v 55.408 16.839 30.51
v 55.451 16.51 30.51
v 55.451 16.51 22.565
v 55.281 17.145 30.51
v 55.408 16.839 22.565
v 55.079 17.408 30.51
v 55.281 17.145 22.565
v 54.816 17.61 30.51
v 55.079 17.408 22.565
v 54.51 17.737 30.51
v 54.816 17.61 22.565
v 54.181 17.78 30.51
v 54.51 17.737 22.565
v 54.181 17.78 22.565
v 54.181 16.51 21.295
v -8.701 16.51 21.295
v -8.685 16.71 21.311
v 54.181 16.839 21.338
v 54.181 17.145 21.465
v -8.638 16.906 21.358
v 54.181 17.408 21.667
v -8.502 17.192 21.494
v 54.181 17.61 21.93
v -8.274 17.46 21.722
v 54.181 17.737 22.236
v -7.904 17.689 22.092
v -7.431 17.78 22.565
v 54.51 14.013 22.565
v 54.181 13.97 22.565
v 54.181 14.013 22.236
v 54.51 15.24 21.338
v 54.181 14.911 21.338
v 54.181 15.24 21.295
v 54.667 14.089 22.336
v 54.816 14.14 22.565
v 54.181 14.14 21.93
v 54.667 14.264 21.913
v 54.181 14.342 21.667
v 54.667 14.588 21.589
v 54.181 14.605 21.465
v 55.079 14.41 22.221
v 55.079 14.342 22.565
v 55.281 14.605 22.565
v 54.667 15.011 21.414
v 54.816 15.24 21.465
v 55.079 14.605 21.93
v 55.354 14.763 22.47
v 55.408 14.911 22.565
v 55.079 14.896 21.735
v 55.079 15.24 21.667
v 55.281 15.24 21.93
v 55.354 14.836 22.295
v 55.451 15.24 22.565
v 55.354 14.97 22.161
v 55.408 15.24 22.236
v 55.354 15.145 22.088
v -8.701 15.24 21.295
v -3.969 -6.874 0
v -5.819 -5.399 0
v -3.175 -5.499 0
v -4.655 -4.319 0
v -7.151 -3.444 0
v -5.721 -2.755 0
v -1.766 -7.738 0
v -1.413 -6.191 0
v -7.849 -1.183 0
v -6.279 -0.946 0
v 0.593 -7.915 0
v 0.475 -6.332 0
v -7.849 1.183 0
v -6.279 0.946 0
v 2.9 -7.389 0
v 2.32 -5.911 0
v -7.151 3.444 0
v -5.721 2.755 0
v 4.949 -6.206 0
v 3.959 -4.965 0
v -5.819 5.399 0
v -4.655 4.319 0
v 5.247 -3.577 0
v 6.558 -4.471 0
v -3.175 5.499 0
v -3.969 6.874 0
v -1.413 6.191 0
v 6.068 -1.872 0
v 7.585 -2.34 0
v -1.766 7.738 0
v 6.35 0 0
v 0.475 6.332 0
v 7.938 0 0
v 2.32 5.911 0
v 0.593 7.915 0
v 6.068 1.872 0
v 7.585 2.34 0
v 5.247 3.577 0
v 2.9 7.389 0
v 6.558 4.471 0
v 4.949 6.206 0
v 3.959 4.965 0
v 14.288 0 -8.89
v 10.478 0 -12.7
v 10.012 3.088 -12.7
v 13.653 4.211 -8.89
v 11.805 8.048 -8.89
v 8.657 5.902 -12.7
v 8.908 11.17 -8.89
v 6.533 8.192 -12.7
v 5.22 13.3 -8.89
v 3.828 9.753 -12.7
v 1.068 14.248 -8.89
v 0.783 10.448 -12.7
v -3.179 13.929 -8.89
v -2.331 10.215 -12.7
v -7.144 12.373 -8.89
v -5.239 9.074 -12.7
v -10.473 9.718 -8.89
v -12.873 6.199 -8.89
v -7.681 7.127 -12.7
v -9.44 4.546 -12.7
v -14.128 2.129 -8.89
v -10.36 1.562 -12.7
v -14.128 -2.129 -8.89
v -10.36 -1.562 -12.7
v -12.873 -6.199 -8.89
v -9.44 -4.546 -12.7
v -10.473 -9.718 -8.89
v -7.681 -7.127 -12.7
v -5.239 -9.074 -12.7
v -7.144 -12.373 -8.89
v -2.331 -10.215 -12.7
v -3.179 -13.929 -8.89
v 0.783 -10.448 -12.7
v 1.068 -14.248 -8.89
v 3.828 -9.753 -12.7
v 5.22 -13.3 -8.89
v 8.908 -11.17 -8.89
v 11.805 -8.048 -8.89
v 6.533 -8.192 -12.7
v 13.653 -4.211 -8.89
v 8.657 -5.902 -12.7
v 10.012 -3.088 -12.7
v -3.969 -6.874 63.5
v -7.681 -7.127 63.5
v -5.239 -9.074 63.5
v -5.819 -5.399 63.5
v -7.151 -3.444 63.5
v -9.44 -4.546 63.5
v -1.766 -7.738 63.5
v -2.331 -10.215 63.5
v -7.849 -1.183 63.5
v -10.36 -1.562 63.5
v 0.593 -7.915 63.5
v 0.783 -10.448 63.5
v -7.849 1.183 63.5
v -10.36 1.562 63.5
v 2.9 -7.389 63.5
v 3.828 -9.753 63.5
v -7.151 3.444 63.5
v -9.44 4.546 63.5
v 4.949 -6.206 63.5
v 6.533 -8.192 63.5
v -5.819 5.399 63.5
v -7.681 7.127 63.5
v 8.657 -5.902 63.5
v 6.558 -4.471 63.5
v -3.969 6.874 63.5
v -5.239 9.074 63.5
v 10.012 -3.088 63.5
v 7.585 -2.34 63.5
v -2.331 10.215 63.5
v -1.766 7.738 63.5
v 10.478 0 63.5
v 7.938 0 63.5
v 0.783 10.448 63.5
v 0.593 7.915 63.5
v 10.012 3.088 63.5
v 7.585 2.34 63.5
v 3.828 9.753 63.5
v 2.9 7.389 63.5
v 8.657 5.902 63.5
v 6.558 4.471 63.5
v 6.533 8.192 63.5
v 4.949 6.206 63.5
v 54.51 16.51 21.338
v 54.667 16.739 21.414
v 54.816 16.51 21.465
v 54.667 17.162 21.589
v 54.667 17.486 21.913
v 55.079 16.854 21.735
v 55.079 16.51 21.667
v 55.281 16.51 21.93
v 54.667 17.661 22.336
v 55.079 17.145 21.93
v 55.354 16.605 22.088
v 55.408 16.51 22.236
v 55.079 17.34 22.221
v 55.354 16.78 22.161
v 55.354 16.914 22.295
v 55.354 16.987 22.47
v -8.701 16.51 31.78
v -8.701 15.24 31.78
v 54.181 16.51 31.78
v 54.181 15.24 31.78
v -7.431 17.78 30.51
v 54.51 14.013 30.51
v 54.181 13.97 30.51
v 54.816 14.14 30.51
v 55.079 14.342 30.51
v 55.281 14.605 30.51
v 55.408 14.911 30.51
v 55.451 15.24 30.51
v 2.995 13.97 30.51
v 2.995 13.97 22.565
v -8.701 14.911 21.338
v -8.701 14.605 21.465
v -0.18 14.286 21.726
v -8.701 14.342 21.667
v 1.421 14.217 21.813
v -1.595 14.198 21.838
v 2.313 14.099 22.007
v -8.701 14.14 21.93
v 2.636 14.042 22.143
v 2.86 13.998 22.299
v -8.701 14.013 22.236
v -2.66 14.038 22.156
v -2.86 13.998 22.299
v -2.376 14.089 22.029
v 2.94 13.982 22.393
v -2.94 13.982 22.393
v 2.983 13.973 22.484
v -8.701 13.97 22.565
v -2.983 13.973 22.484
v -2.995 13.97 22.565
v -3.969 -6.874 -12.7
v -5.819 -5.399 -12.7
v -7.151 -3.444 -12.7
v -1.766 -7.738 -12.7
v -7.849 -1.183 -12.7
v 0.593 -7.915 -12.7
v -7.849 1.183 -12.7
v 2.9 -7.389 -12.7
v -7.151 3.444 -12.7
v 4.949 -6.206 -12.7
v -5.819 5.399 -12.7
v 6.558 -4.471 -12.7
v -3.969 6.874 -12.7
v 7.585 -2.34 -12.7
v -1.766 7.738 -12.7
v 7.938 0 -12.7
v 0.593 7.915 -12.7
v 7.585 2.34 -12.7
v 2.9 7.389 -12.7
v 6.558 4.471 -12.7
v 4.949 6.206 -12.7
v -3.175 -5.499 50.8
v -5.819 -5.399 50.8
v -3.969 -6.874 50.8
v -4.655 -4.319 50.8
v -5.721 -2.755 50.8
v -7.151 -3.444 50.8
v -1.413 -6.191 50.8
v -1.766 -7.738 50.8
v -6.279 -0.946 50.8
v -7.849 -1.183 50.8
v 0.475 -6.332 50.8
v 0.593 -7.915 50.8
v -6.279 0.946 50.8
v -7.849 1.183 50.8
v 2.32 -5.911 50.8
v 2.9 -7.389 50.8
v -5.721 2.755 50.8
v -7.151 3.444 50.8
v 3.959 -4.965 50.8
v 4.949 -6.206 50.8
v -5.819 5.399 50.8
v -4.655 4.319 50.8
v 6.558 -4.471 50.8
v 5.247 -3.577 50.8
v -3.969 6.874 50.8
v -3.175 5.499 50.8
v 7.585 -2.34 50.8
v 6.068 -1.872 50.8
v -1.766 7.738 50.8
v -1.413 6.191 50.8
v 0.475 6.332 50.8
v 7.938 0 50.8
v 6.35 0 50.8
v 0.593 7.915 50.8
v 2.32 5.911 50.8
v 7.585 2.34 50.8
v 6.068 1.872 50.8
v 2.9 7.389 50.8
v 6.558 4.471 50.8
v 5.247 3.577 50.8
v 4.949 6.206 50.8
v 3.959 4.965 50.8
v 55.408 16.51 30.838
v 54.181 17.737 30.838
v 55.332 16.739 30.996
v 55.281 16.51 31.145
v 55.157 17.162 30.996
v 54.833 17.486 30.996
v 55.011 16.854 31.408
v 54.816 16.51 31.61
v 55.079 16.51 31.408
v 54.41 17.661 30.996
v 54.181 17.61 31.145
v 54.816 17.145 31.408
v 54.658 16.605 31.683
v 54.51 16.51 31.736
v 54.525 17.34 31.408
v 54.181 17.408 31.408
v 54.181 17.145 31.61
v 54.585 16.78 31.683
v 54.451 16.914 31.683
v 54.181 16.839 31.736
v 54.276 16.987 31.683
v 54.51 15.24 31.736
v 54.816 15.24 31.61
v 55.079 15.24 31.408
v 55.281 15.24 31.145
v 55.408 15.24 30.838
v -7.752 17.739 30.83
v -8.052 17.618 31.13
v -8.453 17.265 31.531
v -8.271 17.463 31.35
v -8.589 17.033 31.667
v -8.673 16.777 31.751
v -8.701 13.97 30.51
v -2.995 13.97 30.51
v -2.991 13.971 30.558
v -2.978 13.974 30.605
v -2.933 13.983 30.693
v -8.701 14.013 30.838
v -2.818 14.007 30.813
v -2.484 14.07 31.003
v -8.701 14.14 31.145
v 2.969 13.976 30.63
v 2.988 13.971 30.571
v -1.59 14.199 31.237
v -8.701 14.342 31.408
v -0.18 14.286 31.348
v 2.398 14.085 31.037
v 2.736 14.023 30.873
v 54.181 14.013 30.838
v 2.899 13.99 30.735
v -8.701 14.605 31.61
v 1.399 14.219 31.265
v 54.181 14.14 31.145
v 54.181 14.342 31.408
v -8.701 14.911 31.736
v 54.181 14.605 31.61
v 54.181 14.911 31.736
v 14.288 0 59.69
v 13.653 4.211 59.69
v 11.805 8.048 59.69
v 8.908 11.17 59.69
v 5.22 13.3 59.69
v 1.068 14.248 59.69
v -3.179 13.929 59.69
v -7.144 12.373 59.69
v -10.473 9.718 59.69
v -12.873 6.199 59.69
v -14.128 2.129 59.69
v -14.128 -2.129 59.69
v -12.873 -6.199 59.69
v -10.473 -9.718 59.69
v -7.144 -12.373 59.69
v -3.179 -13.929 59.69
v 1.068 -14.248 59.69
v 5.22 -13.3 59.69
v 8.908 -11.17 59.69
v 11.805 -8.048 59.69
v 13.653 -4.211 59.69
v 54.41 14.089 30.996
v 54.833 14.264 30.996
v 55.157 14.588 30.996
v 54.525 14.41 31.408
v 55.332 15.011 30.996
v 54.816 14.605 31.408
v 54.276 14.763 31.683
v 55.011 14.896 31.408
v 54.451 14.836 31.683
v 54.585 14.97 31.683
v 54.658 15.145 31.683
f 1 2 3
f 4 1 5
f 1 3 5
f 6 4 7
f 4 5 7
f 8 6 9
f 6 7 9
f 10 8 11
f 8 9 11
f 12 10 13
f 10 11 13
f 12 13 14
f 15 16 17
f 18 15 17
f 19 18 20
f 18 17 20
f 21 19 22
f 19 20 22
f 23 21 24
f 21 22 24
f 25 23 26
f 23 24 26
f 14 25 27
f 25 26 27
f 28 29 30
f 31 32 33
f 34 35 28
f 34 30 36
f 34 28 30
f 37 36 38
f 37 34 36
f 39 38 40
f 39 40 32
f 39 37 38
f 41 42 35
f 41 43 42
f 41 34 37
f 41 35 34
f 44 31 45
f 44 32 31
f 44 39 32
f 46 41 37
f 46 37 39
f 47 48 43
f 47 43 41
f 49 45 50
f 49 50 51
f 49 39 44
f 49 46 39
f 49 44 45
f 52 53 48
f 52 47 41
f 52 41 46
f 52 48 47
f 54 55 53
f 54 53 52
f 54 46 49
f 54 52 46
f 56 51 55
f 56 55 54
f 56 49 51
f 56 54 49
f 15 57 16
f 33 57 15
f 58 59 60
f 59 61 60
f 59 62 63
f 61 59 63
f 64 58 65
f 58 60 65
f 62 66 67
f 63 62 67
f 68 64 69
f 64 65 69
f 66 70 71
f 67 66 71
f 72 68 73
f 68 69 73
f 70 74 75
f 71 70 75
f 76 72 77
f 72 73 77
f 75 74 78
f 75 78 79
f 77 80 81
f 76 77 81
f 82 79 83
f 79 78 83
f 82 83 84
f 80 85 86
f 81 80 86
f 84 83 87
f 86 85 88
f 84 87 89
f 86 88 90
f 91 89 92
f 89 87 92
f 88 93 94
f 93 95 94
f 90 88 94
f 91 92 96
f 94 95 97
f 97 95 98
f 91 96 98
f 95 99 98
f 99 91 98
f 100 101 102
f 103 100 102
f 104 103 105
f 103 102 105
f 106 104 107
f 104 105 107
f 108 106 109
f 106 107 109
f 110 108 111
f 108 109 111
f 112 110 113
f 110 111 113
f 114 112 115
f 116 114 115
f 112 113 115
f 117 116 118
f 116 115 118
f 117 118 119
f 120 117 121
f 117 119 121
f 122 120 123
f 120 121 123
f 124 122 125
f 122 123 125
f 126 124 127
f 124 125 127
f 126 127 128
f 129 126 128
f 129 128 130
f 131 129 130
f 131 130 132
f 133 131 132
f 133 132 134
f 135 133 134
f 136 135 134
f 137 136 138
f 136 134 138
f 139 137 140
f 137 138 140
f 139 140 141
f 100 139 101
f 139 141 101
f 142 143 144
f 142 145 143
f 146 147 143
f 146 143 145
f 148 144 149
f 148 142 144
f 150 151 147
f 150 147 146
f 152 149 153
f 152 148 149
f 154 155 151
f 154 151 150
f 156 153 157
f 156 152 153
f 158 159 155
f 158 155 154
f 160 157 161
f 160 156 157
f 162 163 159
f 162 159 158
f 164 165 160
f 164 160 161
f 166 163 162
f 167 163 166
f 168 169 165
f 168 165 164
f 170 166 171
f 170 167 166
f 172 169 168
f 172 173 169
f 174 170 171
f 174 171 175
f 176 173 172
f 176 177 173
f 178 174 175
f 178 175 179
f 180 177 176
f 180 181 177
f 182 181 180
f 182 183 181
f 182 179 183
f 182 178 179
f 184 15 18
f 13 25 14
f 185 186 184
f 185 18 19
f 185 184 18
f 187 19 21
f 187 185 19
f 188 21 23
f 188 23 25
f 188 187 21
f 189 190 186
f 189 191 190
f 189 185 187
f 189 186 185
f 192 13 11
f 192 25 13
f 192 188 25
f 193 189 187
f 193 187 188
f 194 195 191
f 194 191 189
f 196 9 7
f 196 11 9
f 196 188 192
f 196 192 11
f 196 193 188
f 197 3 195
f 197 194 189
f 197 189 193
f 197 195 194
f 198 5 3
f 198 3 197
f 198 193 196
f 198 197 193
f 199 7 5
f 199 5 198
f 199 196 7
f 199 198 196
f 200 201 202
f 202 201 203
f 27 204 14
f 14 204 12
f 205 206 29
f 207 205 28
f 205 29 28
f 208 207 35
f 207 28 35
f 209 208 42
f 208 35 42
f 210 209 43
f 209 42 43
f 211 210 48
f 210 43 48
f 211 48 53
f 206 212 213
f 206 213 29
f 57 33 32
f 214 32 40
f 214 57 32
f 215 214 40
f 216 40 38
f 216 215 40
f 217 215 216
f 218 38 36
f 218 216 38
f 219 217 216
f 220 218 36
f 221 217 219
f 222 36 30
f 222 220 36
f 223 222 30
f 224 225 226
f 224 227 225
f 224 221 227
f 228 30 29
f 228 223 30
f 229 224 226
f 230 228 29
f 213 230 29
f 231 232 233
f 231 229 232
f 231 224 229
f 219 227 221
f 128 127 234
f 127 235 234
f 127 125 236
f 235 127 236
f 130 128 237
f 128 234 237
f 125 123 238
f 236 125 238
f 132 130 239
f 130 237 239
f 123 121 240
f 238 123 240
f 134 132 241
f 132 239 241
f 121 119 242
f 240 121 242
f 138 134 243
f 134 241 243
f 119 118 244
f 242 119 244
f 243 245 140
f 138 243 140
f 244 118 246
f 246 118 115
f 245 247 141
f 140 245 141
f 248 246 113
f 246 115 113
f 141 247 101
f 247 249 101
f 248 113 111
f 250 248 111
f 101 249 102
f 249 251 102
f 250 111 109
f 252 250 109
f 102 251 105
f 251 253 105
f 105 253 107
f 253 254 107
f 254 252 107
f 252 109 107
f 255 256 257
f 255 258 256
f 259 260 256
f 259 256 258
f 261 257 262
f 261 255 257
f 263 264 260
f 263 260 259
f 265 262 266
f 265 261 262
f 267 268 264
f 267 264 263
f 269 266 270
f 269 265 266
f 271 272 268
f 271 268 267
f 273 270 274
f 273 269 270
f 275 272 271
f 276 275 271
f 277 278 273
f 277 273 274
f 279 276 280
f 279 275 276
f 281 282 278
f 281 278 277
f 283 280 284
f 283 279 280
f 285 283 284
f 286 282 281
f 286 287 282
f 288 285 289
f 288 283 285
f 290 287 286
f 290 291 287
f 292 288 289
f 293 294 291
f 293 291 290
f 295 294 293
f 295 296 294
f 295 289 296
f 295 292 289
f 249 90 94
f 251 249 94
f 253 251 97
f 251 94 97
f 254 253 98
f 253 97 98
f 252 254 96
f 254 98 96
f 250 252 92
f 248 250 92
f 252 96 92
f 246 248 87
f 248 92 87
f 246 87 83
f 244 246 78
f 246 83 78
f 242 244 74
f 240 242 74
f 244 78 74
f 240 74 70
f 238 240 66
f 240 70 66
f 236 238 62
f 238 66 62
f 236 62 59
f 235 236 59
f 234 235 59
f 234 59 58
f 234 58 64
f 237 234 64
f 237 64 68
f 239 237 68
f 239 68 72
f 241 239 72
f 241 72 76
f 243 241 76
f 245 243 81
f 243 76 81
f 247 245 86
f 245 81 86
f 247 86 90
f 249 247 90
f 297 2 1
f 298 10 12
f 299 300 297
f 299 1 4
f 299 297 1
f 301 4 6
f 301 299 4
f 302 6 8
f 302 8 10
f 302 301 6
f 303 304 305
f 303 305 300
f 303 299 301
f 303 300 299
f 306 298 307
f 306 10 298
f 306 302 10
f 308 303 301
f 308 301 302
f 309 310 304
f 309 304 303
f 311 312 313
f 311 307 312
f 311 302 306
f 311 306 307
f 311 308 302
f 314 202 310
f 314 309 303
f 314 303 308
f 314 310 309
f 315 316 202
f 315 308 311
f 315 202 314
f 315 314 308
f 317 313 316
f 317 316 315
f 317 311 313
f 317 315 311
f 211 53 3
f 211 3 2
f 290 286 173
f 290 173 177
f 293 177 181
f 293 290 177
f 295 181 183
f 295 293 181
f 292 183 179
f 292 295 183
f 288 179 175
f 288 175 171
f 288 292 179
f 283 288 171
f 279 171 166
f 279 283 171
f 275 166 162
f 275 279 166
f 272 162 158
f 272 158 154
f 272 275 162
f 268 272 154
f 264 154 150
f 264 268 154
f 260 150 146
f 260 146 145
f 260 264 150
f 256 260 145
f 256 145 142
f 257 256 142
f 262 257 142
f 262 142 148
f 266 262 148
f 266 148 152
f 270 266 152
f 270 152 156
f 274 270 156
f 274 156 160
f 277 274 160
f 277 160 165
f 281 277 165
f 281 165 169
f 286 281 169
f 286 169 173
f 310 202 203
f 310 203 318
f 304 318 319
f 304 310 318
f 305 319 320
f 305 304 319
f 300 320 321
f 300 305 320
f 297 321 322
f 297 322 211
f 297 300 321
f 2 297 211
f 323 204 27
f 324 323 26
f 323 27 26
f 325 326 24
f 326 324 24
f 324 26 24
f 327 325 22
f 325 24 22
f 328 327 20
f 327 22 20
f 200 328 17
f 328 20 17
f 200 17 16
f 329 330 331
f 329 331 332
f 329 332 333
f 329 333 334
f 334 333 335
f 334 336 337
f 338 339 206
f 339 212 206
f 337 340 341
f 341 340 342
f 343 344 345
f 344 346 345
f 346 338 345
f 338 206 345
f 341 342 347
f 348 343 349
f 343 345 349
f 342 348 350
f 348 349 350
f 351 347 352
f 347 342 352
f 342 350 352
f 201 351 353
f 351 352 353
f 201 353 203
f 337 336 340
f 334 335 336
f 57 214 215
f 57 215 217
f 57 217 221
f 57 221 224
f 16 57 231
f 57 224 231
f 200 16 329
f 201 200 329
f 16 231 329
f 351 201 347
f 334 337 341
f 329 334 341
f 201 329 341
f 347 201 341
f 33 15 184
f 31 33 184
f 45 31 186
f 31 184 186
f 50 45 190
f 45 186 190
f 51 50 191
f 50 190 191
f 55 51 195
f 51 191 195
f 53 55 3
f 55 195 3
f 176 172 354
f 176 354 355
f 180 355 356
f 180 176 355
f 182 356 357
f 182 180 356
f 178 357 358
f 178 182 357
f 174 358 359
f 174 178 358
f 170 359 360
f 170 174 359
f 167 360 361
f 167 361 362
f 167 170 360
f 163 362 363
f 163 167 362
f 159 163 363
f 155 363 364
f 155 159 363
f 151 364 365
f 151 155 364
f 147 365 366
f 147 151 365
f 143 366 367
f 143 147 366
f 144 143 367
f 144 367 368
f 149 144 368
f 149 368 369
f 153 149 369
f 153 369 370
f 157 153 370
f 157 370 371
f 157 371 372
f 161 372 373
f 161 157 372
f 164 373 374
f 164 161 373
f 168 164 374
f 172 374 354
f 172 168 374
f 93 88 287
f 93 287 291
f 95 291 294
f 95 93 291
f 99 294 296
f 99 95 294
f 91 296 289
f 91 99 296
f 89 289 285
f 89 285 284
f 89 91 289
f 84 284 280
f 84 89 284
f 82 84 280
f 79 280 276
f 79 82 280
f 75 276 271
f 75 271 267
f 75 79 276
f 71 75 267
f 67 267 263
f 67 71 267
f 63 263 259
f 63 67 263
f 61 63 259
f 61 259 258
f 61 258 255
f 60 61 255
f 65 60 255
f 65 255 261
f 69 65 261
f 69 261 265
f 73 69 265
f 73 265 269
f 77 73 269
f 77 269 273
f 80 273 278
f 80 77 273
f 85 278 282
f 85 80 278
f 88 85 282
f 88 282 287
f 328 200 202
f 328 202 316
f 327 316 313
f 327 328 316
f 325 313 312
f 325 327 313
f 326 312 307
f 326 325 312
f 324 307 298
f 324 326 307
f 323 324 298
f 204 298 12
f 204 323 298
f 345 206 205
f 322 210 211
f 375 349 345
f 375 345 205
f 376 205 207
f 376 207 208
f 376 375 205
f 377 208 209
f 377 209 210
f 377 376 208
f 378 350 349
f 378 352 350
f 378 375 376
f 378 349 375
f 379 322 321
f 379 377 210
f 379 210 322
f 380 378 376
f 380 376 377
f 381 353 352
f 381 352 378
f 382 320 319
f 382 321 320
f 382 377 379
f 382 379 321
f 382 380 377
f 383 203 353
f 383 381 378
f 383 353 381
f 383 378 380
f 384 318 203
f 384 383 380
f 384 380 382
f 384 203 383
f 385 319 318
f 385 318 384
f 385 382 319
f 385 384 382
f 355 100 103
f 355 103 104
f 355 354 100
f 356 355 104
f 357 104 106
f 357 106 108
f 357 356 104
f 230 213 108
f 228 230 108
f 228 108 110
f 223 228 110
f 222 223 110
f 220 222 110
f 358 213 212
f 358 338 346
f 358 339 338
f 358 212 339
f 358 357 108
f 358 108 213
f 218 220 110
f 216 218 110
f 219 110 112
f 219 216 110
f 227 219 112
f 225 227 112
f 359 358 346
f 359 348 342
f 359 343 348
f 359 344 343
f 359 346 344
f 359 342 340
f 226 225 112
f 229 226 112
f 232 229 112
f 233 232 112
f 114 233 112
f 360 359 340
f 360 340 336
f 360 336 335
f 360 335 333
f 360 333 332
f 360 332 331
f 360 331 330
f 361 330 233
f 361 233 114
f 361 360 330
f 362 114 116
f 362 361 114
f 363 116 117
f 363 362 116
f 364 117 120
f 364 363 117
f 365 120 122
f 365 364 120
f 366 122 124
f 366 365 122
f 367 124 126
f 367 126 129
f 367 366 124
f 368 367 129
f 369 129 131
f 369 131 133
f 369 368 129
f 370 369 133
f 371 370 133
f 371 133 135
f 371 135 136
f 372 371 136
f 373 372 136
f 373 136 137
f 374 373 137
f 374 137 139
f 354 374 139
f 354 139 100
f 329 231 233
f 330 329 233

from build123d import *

# Parameters (mm, degrees)
F0_R          = 7.9375
F0_R_2        = 6.35
F2_DEPTH      = 50.8
F3_R          = 14.2875
F3_R_2        = 7.9375
F4_DEPTH      = 63.5
F4_DEPTH_BACK = 12.7
F5_SIZE       = 3.81
F7_START      = -13.97
F6_W          = 64.1522035003
F6_H          = 10.4847997427
F7_DEPTH      = 3.81
F8_T1_DEPTH   = 66.0572035003
F8_T3_DEPTH   = 16.8347997427
F8_T5_DEPTH   = 7.9447997427
F8_T7_DEPTH   = 1.27
F8_S11_W      = 1.27
F8_S11_H      = 1.27
F8_T12_DEPTH  = 1.27
F8_S17_W      = 1.27
F8_S17_H      = 1.27
F8_T18_DEPTH  = 1.27
F8_S23_W      = 1.27
F8_S23_H      = 1.27
F8_T24_DEPTH  = 1.27
F8_S29_W      = 1.27
F8_S29_H      = 1.27
F8_T30_DEPTH  = 1.27
F8_T36_DEPTH  = 54.3607688419
F8_S37_R      = 14.2875
F8_T38_DEPTH  = 29
F8_T42_DEPTH  = 54.3607688419
F8_S43_R      = 14.2875
F8_T44_DEPTH  = 29
F8_T48_DEPTH  = 12.0558566395
F8_S49_R      = 14.2875
F8_T50_DEPTH  = 8
F8_T54_DEPTH  = 12.0558566395
F8_S55_R      = 14.2875
F8_T56_DEPTH  = 8


# Not quite as in the source:
# - a fillet or chamfer that OpenCascade refuses, or shapes differently, is made with other operations: its cross-section is extruded or revolved along the edge and cut away or added
# - a feature names something its author has since deleted; it is built from what else it names


with BuildPart() as f2:
    # F0 (on Top) → F2 (new body)
    with BuildSketch(Plane.XY):
        Circle(F0_R)
        Circle(F0_R_2, mode=Mode.SUBTRACT)
    extrude(amount=F2_DEPTH)

    # F3 (on face) → F4 (join, two sides)
    with BuildSketch(Plane.XY) as f4_sk:
        Circle(F3_R)
        Circle(F3_R_2, mode=Mode.SUBTRACT)
    extrude(amount=F4_DEPTH)
    extrude(f4_sk.sketch, amount=-F4_DEPTH_BACK)

    # F5
    f5_edges = [f2.edges().sort_by_distance(p)[0] for p in [
        (-14.2875, 0, 63.5),
        (-14.2875, 0, -12.7),
    ]]
    chamfer(f5_edges, length=F5_SIZE)

    # F6 (on Front) → F7 (join)
    with BuildSketch(Plane.XZ.offset(F7_START)):
        with Locations((23.3749561012, 26.5372619033)):
            Rectangle(F6_W, F6_H)
    extrude(amount=-F7_DEPTH)

    # F8: fillet of radius 1.27 on 11 edges, made by hand

    # F8_s2 → F8_t1 (cut)
    with BuildSketch(Plane.YZ.offset(-11.876145649)):
        with BuildLine():
            ThreePointArc((16.51, 31.7796617746), (17.4080256121, 31.4076873867), (17.78, 30.5096617746))
            Line((17.78, 30.5096617746), (17.78, 31.7796617746))
            Line((17.78, 31.7796617746), (16.51, 31.7796617746))
        make_face()
        with BuildLine():
            ThreePointArc((16.51, 21.2948620319), (17.4080256121, 21.6668364198), (17.78, 22.5648620319))
            Line((17.78, 22.5648620319), (17.78, 21.2948620319))
            Line((17.78, 21.2948620319), (16.51, 21.2948620319))
        make_face()
    extrude(amount=F8_T1_DEPTH, mode=Mode.SUBTRACT)

    # F8_s4 → F8_t3 (cut)
    with BuildSketch(Plane.XY.offset(18.1198620319)):
        with BuildLine():
            ThreePointArc((-7.431145649, 17.78), (-8.3291712611, 17.4080256121), (-8.701145649, 16.51))
            Line((-8.701145649, 16.51), (-8.701145649, 17.78))
            Line((-8.701145649, 17.78), (-7.431145649, 17.78))
        make_face()
    extrude(amount=F8_T3_DEPTH, mode=Mode.SUBTRACT)

    # F8_s6 → F8_t5 (cut)
    with BuildSketch(Plane.XY.offset(22.5648620319)):
        with BuildLine():
            ThreePointArc((54.1810578513, 13.97), (55.0790834634, 14.3419743879), (55.4510578513, 15.24))
            Line((55.4510578513, 15.24), (55.4510578513, 13.97))
            Line((55.4510578513, 13.97), (54.1810578513, 13.97))
        make_face()
        with BuildLine():
            ThreePointArc((55.4510578513, 16.51), (55.0790834634, 17.4080256121), (54.1810578513, 17.78))
            Line((54.1810578513, 17.78), (55.4510578513, 17.78))
            Line((55.4510578513, 17.78), (55.4510578513, 16.51))
        make_face()
    extrude(amount=F8_T5_DEPTH, mode=Mode.SUBTRACT)

    # F8_s8 → F8_t7 (cut)
    with BuildSketch(Plane.XZ.offset(-16.51)):
        with BuildLine():
            ThreePointArc((54.1810578513, 31.7796617746), (55.0790834634, 31.4076873867), (55.4510578513, 30.5096617746))
            Line((55.4510578513, 30.5096617746), (55.4510578513, 31.7796617746))
            Line((55.4510578513, 31.7796617746), (54.1810578513, 31.7796617746))
        make_face()
        with BuildLine():
            ThreePointArc((54.1810578513, 21.2948620319), (55.0790834634, 21.6668364198), (55.4510578513, 22.5648620319))
            Line((55.4510578513, 22.5648620319), (55.4510578513, 21.2948620319))
            Line((55.4510578513, 21.2948620319), (54.1810578513, 21.2948620319))
        make_face()
    extrude(amount=F8_T7_DEPTH, mode=Mode.SUBTRACT)


with BuildPart() as f8_tool10:
    # F8_s11 → F8_t12 (new body)
    with BuildSketch(Plane.XY.offset(30.5096617746)):
        with Locations((54.8160578513, 17.145)):
            Rectangle(F8_S11_W, F8_S11_H)
    extrude(amount=F8_T12_DEPTH)

    # F8_s13 → F8_t14 (revolve, cut)
    with BuildSketch(Plane(origin=(54.1810578513, 16.51, 30.5096617746), x_dir=(-0.7071067812, -0.7071067812, 0), z_dir=(-0.7071067812, 0.7071067812, 0))):
        with BuildLine():
            ThreePointArc((0, -1.27), (1.27, 0), (0, 1.27))
            Line((0, 1.27), (0, -1.27))
        make_face()
    revolve(axis=Axis((54.1810578513, 16.51, 30.5096617746), (0, 0, 1)), mode=Mode.SUBTRACT)


with BuildPart() as f2_1:
    add(f2.part)

    # F8_t9: cut F8_tool10
    add(f8_tool10.part, mode=Mode.SUBTRACT)


with BuildPart() as f8_tool16:
    # F8_s17 → F8_t18 (new body)
    with BuildSketch(Plane.YZ.offset(54.1810578513)):
        with Locations((17.145, 21.9298620319)):
            Rectangle(F8_S17_W, F8_S17_H)
    extrude(amount=F8_T18_DEPTH)

    # F8_s19 → F8_t20 (revolve, cut)
    with BuildSketch(Plane(origin=(54.1810578513, 16.51, 22.5648620319), x_dir=(0, -0.7071067812, 0.7071067812), z_dir=(0, 0.7071067812, 0.7071067812))):
        with BuildLine():
            ThreePointArc((0, -1.27), (1.27, 0), (0, 1.27))
            Line((0, 1.27), (0, -1.27))
        make_face()
    revolve(axis=Axis((54.1810578513, 16.51, 22.5648620319), (1, 0, 0)), mode=Mode.SUBTRACT)


with BuildPart() as f2_2:
    add(f2_1.part)

    # F8_t15: cut F8_tool16
    add(f8_tool16.part, mode=Mode.SUBTRACT)


with BuildPart() as f8_tool22:
    # F8_s23 → F8_t24 (new body)
    with BuildSketch(Plane.YZ.offset(54.1810578513)):
        with Locations((14.605, 21.9298620319)):
            Rectangle(F8_S23_W, F8_S23_H)
    extrude(amount=F8_T24_DEPTH)

    # F8_s25 → F8_t26 (revolve, cut)
    with BuildSketch(Plane(origin=(54.1810578513, 15.24, 22.5648620319), x_dir=(0, 0.7071067812, 0.7071067812), z_dir=(0, 0.7071067812, -0.7071067812))):
        with BuildLine():
            ThreePointArc((0, -1.27), (1.27, 0), (0, 1.27))
            Line((0, 1.27), (0, -1.27))
        make_face()
    revolve(axis=Axis((54.1810578513, 15.24, 22.5648620319), (1, 0, 0)), mode=Mode.SUBTRACT)


with BuildPart() as f2_3:
    add(f2_2.part)

    # F8_t21: cut F8_tool22
    add(f8_tool22.part, mode=Mode.SUBTRACT)


with BuildPart() as f8_tool28:
    # F8_s29 → F8_t30 (new body)
    with BuildSketch(Plane.XY.offset(30.5096617746)):
        with Locations((54.8160578513, 14.605)):
            Rectangle(F8_S29_W, F8_S29_H)
    extrude(amount=F8_T30_DEPTH)

    # F8_s31 → F8_t32 (revolve, cut)
    with BuildSketch(Plane(origin=(54.1810578513, 15.24, 30.5096617746), x_dir=(-0.7071067812, 0.7071067812, 0), z_dir=(0.7071067812, 0.7071067812, 0))):
        with BuildLine():
            ThreePointArc((0, -1.27), (1.27, 0), (0, 1.27))
            Line((0, 1.27), (0, -1.27))
        make_face()
    revolve(axis=Axis((54.1810578513, 15.24, 30.5096617746), (0, 0, 1)), mode=Mode.SUBTRACT)


with BuildPart() as f2_4:
    add(f2_3.part)

    # F8_t27: cut F8_tool28
    add(f8_tool28.part, mode=Mode.SUBTRACT)


with BuildPart() as f8_tool34:
    # F8_s35 → F8_t36 (new body)
    with BuildSketch(Plane.YZ.offset(-0.1797109906)):
        with BuildLine():
            ThreePointArc((13.97, 22.5648620319), (14.3419743879, 21.6668364198), (15.24, 21.2948620319))
            Line((15.24, 21.2948620319), (13.97, 21.2948620319))
            Line((13.97, 21.2948620319), (13.97, 22.5648620319))
        make_face()
    extrude(amount=F8_T36_DEPTH)

    # F8_s37 → F8_t38 (cut, symmetric)
    with BuildSketch(Plane.XY.offset(21.9)):
        Circle(F8_S37_R)
    extrude(amount=F8_T38_DEPTH, both=True, mode=Mode.SUBTRACT)


with BuildPart() as f2_5:
    add(f2_4.part)

    # F8_t33: cut F8_tool34
    add(f8_tool34.part, mode=Mode.SUBTRACT)


with BuildPart() as f8_tool40:
    # F8_s41 → F8_t42 (new body)
    with BuildSketch(Plane.YZ.offset(54.1810578513)):
        with BuildLine():
            ThreePointArc((13.97, 30.5096617746), (14.3419743879, 31.4076873867), (15.24, 31.7796617746))
            Line((15.24, 31.7796617746), (13.97, 31.7796617746))
            Line((13.97, 31.7796617746), (13.97, 30.5096617746))
        make_face()
    extrude(amount=-F8_T42_DEPTH)

    # F8_s43 → F8_t44 (cut, symmetric)
    with BuildSketch(Plane.XY.offset(31.1)):
        Circle(F8_S43_R)
    extrude(amount=F8_T44_DEPTH, both=True, mode=Mode.SUBTRACT)


with BuildPart() as f2_6:
    add(f2_5.part)

    # F8_t39: cut F8_tool40
    add(f8_tool40.part, mode=Mode.SUBTRACT)


with BuildPart() as f8_tool46:
    # F8_s47 → F8_t48 (new body)
    with BuildSketch(Plane.YZ.offset(-11.876145649)):
        with BuildLine():
            ThreePointArc((15.24, 21.2948620319), (14.3419743879, 21.6668364198), (13.97, 22.5648620319))
            Line((13.97, 22.5648620319), (13.97, 21.2948620319))
            Line((13.97, 21.2948620319), (15.24, 21.2948620319))
        make_face()
    extrude(amount=F8_T48_DEPTH)

    # F8_s49 → F8_t50 (cut, symmetric)
    with BuildSketch(Plane.XY.offset(21.9)):
        Circle(F8_S49_R)
    extrude(amount=F8_T50_DEPTH, both=True, mode=Mode.SUBTRACT)


with BuildPart() as f2_7:
    add(f2_6.part)

    # F8_t45: cut F8_tool46
    add(f8_tool46.part, mode=Mode.SUBTRACT)


with BuildPart() as f8_tool52:
    # F8_s53 → F8_t54 (new body)
    with BuildSketch(Plane.YZ.offset(0.1797109906)):
        with BuildLine():
            ThreePointArc((13.97, 30.5096617746), (14.3419743879, 31.4076873867), (15.24, 31.7796617746))
            Line((15.24, 31.7796617746), (13.97, 31.7796617746))
            Line((13.97, 31.7796617746), (13.97, 30.5096617746))
        make_face()
    extrude(amount=-F8_T54_DEPTH)

    # F8_s55 → F8_t56 (cut, symmetric)
    with BuildSketch(Plane.XY.offset(31.1)):
        Circle(F8_S55_R)
    extrude(amount=F8_T56_DEPTH, both=True, mode=Mode.SUBTRACT)


with BuildPart() as f2_8:
    add(f2_7.part)

    # F8_t51: cut F8_tool52
    add(f8_tool52.part, mode=Mode.SUBTRACT)


solid = f2_8.part
